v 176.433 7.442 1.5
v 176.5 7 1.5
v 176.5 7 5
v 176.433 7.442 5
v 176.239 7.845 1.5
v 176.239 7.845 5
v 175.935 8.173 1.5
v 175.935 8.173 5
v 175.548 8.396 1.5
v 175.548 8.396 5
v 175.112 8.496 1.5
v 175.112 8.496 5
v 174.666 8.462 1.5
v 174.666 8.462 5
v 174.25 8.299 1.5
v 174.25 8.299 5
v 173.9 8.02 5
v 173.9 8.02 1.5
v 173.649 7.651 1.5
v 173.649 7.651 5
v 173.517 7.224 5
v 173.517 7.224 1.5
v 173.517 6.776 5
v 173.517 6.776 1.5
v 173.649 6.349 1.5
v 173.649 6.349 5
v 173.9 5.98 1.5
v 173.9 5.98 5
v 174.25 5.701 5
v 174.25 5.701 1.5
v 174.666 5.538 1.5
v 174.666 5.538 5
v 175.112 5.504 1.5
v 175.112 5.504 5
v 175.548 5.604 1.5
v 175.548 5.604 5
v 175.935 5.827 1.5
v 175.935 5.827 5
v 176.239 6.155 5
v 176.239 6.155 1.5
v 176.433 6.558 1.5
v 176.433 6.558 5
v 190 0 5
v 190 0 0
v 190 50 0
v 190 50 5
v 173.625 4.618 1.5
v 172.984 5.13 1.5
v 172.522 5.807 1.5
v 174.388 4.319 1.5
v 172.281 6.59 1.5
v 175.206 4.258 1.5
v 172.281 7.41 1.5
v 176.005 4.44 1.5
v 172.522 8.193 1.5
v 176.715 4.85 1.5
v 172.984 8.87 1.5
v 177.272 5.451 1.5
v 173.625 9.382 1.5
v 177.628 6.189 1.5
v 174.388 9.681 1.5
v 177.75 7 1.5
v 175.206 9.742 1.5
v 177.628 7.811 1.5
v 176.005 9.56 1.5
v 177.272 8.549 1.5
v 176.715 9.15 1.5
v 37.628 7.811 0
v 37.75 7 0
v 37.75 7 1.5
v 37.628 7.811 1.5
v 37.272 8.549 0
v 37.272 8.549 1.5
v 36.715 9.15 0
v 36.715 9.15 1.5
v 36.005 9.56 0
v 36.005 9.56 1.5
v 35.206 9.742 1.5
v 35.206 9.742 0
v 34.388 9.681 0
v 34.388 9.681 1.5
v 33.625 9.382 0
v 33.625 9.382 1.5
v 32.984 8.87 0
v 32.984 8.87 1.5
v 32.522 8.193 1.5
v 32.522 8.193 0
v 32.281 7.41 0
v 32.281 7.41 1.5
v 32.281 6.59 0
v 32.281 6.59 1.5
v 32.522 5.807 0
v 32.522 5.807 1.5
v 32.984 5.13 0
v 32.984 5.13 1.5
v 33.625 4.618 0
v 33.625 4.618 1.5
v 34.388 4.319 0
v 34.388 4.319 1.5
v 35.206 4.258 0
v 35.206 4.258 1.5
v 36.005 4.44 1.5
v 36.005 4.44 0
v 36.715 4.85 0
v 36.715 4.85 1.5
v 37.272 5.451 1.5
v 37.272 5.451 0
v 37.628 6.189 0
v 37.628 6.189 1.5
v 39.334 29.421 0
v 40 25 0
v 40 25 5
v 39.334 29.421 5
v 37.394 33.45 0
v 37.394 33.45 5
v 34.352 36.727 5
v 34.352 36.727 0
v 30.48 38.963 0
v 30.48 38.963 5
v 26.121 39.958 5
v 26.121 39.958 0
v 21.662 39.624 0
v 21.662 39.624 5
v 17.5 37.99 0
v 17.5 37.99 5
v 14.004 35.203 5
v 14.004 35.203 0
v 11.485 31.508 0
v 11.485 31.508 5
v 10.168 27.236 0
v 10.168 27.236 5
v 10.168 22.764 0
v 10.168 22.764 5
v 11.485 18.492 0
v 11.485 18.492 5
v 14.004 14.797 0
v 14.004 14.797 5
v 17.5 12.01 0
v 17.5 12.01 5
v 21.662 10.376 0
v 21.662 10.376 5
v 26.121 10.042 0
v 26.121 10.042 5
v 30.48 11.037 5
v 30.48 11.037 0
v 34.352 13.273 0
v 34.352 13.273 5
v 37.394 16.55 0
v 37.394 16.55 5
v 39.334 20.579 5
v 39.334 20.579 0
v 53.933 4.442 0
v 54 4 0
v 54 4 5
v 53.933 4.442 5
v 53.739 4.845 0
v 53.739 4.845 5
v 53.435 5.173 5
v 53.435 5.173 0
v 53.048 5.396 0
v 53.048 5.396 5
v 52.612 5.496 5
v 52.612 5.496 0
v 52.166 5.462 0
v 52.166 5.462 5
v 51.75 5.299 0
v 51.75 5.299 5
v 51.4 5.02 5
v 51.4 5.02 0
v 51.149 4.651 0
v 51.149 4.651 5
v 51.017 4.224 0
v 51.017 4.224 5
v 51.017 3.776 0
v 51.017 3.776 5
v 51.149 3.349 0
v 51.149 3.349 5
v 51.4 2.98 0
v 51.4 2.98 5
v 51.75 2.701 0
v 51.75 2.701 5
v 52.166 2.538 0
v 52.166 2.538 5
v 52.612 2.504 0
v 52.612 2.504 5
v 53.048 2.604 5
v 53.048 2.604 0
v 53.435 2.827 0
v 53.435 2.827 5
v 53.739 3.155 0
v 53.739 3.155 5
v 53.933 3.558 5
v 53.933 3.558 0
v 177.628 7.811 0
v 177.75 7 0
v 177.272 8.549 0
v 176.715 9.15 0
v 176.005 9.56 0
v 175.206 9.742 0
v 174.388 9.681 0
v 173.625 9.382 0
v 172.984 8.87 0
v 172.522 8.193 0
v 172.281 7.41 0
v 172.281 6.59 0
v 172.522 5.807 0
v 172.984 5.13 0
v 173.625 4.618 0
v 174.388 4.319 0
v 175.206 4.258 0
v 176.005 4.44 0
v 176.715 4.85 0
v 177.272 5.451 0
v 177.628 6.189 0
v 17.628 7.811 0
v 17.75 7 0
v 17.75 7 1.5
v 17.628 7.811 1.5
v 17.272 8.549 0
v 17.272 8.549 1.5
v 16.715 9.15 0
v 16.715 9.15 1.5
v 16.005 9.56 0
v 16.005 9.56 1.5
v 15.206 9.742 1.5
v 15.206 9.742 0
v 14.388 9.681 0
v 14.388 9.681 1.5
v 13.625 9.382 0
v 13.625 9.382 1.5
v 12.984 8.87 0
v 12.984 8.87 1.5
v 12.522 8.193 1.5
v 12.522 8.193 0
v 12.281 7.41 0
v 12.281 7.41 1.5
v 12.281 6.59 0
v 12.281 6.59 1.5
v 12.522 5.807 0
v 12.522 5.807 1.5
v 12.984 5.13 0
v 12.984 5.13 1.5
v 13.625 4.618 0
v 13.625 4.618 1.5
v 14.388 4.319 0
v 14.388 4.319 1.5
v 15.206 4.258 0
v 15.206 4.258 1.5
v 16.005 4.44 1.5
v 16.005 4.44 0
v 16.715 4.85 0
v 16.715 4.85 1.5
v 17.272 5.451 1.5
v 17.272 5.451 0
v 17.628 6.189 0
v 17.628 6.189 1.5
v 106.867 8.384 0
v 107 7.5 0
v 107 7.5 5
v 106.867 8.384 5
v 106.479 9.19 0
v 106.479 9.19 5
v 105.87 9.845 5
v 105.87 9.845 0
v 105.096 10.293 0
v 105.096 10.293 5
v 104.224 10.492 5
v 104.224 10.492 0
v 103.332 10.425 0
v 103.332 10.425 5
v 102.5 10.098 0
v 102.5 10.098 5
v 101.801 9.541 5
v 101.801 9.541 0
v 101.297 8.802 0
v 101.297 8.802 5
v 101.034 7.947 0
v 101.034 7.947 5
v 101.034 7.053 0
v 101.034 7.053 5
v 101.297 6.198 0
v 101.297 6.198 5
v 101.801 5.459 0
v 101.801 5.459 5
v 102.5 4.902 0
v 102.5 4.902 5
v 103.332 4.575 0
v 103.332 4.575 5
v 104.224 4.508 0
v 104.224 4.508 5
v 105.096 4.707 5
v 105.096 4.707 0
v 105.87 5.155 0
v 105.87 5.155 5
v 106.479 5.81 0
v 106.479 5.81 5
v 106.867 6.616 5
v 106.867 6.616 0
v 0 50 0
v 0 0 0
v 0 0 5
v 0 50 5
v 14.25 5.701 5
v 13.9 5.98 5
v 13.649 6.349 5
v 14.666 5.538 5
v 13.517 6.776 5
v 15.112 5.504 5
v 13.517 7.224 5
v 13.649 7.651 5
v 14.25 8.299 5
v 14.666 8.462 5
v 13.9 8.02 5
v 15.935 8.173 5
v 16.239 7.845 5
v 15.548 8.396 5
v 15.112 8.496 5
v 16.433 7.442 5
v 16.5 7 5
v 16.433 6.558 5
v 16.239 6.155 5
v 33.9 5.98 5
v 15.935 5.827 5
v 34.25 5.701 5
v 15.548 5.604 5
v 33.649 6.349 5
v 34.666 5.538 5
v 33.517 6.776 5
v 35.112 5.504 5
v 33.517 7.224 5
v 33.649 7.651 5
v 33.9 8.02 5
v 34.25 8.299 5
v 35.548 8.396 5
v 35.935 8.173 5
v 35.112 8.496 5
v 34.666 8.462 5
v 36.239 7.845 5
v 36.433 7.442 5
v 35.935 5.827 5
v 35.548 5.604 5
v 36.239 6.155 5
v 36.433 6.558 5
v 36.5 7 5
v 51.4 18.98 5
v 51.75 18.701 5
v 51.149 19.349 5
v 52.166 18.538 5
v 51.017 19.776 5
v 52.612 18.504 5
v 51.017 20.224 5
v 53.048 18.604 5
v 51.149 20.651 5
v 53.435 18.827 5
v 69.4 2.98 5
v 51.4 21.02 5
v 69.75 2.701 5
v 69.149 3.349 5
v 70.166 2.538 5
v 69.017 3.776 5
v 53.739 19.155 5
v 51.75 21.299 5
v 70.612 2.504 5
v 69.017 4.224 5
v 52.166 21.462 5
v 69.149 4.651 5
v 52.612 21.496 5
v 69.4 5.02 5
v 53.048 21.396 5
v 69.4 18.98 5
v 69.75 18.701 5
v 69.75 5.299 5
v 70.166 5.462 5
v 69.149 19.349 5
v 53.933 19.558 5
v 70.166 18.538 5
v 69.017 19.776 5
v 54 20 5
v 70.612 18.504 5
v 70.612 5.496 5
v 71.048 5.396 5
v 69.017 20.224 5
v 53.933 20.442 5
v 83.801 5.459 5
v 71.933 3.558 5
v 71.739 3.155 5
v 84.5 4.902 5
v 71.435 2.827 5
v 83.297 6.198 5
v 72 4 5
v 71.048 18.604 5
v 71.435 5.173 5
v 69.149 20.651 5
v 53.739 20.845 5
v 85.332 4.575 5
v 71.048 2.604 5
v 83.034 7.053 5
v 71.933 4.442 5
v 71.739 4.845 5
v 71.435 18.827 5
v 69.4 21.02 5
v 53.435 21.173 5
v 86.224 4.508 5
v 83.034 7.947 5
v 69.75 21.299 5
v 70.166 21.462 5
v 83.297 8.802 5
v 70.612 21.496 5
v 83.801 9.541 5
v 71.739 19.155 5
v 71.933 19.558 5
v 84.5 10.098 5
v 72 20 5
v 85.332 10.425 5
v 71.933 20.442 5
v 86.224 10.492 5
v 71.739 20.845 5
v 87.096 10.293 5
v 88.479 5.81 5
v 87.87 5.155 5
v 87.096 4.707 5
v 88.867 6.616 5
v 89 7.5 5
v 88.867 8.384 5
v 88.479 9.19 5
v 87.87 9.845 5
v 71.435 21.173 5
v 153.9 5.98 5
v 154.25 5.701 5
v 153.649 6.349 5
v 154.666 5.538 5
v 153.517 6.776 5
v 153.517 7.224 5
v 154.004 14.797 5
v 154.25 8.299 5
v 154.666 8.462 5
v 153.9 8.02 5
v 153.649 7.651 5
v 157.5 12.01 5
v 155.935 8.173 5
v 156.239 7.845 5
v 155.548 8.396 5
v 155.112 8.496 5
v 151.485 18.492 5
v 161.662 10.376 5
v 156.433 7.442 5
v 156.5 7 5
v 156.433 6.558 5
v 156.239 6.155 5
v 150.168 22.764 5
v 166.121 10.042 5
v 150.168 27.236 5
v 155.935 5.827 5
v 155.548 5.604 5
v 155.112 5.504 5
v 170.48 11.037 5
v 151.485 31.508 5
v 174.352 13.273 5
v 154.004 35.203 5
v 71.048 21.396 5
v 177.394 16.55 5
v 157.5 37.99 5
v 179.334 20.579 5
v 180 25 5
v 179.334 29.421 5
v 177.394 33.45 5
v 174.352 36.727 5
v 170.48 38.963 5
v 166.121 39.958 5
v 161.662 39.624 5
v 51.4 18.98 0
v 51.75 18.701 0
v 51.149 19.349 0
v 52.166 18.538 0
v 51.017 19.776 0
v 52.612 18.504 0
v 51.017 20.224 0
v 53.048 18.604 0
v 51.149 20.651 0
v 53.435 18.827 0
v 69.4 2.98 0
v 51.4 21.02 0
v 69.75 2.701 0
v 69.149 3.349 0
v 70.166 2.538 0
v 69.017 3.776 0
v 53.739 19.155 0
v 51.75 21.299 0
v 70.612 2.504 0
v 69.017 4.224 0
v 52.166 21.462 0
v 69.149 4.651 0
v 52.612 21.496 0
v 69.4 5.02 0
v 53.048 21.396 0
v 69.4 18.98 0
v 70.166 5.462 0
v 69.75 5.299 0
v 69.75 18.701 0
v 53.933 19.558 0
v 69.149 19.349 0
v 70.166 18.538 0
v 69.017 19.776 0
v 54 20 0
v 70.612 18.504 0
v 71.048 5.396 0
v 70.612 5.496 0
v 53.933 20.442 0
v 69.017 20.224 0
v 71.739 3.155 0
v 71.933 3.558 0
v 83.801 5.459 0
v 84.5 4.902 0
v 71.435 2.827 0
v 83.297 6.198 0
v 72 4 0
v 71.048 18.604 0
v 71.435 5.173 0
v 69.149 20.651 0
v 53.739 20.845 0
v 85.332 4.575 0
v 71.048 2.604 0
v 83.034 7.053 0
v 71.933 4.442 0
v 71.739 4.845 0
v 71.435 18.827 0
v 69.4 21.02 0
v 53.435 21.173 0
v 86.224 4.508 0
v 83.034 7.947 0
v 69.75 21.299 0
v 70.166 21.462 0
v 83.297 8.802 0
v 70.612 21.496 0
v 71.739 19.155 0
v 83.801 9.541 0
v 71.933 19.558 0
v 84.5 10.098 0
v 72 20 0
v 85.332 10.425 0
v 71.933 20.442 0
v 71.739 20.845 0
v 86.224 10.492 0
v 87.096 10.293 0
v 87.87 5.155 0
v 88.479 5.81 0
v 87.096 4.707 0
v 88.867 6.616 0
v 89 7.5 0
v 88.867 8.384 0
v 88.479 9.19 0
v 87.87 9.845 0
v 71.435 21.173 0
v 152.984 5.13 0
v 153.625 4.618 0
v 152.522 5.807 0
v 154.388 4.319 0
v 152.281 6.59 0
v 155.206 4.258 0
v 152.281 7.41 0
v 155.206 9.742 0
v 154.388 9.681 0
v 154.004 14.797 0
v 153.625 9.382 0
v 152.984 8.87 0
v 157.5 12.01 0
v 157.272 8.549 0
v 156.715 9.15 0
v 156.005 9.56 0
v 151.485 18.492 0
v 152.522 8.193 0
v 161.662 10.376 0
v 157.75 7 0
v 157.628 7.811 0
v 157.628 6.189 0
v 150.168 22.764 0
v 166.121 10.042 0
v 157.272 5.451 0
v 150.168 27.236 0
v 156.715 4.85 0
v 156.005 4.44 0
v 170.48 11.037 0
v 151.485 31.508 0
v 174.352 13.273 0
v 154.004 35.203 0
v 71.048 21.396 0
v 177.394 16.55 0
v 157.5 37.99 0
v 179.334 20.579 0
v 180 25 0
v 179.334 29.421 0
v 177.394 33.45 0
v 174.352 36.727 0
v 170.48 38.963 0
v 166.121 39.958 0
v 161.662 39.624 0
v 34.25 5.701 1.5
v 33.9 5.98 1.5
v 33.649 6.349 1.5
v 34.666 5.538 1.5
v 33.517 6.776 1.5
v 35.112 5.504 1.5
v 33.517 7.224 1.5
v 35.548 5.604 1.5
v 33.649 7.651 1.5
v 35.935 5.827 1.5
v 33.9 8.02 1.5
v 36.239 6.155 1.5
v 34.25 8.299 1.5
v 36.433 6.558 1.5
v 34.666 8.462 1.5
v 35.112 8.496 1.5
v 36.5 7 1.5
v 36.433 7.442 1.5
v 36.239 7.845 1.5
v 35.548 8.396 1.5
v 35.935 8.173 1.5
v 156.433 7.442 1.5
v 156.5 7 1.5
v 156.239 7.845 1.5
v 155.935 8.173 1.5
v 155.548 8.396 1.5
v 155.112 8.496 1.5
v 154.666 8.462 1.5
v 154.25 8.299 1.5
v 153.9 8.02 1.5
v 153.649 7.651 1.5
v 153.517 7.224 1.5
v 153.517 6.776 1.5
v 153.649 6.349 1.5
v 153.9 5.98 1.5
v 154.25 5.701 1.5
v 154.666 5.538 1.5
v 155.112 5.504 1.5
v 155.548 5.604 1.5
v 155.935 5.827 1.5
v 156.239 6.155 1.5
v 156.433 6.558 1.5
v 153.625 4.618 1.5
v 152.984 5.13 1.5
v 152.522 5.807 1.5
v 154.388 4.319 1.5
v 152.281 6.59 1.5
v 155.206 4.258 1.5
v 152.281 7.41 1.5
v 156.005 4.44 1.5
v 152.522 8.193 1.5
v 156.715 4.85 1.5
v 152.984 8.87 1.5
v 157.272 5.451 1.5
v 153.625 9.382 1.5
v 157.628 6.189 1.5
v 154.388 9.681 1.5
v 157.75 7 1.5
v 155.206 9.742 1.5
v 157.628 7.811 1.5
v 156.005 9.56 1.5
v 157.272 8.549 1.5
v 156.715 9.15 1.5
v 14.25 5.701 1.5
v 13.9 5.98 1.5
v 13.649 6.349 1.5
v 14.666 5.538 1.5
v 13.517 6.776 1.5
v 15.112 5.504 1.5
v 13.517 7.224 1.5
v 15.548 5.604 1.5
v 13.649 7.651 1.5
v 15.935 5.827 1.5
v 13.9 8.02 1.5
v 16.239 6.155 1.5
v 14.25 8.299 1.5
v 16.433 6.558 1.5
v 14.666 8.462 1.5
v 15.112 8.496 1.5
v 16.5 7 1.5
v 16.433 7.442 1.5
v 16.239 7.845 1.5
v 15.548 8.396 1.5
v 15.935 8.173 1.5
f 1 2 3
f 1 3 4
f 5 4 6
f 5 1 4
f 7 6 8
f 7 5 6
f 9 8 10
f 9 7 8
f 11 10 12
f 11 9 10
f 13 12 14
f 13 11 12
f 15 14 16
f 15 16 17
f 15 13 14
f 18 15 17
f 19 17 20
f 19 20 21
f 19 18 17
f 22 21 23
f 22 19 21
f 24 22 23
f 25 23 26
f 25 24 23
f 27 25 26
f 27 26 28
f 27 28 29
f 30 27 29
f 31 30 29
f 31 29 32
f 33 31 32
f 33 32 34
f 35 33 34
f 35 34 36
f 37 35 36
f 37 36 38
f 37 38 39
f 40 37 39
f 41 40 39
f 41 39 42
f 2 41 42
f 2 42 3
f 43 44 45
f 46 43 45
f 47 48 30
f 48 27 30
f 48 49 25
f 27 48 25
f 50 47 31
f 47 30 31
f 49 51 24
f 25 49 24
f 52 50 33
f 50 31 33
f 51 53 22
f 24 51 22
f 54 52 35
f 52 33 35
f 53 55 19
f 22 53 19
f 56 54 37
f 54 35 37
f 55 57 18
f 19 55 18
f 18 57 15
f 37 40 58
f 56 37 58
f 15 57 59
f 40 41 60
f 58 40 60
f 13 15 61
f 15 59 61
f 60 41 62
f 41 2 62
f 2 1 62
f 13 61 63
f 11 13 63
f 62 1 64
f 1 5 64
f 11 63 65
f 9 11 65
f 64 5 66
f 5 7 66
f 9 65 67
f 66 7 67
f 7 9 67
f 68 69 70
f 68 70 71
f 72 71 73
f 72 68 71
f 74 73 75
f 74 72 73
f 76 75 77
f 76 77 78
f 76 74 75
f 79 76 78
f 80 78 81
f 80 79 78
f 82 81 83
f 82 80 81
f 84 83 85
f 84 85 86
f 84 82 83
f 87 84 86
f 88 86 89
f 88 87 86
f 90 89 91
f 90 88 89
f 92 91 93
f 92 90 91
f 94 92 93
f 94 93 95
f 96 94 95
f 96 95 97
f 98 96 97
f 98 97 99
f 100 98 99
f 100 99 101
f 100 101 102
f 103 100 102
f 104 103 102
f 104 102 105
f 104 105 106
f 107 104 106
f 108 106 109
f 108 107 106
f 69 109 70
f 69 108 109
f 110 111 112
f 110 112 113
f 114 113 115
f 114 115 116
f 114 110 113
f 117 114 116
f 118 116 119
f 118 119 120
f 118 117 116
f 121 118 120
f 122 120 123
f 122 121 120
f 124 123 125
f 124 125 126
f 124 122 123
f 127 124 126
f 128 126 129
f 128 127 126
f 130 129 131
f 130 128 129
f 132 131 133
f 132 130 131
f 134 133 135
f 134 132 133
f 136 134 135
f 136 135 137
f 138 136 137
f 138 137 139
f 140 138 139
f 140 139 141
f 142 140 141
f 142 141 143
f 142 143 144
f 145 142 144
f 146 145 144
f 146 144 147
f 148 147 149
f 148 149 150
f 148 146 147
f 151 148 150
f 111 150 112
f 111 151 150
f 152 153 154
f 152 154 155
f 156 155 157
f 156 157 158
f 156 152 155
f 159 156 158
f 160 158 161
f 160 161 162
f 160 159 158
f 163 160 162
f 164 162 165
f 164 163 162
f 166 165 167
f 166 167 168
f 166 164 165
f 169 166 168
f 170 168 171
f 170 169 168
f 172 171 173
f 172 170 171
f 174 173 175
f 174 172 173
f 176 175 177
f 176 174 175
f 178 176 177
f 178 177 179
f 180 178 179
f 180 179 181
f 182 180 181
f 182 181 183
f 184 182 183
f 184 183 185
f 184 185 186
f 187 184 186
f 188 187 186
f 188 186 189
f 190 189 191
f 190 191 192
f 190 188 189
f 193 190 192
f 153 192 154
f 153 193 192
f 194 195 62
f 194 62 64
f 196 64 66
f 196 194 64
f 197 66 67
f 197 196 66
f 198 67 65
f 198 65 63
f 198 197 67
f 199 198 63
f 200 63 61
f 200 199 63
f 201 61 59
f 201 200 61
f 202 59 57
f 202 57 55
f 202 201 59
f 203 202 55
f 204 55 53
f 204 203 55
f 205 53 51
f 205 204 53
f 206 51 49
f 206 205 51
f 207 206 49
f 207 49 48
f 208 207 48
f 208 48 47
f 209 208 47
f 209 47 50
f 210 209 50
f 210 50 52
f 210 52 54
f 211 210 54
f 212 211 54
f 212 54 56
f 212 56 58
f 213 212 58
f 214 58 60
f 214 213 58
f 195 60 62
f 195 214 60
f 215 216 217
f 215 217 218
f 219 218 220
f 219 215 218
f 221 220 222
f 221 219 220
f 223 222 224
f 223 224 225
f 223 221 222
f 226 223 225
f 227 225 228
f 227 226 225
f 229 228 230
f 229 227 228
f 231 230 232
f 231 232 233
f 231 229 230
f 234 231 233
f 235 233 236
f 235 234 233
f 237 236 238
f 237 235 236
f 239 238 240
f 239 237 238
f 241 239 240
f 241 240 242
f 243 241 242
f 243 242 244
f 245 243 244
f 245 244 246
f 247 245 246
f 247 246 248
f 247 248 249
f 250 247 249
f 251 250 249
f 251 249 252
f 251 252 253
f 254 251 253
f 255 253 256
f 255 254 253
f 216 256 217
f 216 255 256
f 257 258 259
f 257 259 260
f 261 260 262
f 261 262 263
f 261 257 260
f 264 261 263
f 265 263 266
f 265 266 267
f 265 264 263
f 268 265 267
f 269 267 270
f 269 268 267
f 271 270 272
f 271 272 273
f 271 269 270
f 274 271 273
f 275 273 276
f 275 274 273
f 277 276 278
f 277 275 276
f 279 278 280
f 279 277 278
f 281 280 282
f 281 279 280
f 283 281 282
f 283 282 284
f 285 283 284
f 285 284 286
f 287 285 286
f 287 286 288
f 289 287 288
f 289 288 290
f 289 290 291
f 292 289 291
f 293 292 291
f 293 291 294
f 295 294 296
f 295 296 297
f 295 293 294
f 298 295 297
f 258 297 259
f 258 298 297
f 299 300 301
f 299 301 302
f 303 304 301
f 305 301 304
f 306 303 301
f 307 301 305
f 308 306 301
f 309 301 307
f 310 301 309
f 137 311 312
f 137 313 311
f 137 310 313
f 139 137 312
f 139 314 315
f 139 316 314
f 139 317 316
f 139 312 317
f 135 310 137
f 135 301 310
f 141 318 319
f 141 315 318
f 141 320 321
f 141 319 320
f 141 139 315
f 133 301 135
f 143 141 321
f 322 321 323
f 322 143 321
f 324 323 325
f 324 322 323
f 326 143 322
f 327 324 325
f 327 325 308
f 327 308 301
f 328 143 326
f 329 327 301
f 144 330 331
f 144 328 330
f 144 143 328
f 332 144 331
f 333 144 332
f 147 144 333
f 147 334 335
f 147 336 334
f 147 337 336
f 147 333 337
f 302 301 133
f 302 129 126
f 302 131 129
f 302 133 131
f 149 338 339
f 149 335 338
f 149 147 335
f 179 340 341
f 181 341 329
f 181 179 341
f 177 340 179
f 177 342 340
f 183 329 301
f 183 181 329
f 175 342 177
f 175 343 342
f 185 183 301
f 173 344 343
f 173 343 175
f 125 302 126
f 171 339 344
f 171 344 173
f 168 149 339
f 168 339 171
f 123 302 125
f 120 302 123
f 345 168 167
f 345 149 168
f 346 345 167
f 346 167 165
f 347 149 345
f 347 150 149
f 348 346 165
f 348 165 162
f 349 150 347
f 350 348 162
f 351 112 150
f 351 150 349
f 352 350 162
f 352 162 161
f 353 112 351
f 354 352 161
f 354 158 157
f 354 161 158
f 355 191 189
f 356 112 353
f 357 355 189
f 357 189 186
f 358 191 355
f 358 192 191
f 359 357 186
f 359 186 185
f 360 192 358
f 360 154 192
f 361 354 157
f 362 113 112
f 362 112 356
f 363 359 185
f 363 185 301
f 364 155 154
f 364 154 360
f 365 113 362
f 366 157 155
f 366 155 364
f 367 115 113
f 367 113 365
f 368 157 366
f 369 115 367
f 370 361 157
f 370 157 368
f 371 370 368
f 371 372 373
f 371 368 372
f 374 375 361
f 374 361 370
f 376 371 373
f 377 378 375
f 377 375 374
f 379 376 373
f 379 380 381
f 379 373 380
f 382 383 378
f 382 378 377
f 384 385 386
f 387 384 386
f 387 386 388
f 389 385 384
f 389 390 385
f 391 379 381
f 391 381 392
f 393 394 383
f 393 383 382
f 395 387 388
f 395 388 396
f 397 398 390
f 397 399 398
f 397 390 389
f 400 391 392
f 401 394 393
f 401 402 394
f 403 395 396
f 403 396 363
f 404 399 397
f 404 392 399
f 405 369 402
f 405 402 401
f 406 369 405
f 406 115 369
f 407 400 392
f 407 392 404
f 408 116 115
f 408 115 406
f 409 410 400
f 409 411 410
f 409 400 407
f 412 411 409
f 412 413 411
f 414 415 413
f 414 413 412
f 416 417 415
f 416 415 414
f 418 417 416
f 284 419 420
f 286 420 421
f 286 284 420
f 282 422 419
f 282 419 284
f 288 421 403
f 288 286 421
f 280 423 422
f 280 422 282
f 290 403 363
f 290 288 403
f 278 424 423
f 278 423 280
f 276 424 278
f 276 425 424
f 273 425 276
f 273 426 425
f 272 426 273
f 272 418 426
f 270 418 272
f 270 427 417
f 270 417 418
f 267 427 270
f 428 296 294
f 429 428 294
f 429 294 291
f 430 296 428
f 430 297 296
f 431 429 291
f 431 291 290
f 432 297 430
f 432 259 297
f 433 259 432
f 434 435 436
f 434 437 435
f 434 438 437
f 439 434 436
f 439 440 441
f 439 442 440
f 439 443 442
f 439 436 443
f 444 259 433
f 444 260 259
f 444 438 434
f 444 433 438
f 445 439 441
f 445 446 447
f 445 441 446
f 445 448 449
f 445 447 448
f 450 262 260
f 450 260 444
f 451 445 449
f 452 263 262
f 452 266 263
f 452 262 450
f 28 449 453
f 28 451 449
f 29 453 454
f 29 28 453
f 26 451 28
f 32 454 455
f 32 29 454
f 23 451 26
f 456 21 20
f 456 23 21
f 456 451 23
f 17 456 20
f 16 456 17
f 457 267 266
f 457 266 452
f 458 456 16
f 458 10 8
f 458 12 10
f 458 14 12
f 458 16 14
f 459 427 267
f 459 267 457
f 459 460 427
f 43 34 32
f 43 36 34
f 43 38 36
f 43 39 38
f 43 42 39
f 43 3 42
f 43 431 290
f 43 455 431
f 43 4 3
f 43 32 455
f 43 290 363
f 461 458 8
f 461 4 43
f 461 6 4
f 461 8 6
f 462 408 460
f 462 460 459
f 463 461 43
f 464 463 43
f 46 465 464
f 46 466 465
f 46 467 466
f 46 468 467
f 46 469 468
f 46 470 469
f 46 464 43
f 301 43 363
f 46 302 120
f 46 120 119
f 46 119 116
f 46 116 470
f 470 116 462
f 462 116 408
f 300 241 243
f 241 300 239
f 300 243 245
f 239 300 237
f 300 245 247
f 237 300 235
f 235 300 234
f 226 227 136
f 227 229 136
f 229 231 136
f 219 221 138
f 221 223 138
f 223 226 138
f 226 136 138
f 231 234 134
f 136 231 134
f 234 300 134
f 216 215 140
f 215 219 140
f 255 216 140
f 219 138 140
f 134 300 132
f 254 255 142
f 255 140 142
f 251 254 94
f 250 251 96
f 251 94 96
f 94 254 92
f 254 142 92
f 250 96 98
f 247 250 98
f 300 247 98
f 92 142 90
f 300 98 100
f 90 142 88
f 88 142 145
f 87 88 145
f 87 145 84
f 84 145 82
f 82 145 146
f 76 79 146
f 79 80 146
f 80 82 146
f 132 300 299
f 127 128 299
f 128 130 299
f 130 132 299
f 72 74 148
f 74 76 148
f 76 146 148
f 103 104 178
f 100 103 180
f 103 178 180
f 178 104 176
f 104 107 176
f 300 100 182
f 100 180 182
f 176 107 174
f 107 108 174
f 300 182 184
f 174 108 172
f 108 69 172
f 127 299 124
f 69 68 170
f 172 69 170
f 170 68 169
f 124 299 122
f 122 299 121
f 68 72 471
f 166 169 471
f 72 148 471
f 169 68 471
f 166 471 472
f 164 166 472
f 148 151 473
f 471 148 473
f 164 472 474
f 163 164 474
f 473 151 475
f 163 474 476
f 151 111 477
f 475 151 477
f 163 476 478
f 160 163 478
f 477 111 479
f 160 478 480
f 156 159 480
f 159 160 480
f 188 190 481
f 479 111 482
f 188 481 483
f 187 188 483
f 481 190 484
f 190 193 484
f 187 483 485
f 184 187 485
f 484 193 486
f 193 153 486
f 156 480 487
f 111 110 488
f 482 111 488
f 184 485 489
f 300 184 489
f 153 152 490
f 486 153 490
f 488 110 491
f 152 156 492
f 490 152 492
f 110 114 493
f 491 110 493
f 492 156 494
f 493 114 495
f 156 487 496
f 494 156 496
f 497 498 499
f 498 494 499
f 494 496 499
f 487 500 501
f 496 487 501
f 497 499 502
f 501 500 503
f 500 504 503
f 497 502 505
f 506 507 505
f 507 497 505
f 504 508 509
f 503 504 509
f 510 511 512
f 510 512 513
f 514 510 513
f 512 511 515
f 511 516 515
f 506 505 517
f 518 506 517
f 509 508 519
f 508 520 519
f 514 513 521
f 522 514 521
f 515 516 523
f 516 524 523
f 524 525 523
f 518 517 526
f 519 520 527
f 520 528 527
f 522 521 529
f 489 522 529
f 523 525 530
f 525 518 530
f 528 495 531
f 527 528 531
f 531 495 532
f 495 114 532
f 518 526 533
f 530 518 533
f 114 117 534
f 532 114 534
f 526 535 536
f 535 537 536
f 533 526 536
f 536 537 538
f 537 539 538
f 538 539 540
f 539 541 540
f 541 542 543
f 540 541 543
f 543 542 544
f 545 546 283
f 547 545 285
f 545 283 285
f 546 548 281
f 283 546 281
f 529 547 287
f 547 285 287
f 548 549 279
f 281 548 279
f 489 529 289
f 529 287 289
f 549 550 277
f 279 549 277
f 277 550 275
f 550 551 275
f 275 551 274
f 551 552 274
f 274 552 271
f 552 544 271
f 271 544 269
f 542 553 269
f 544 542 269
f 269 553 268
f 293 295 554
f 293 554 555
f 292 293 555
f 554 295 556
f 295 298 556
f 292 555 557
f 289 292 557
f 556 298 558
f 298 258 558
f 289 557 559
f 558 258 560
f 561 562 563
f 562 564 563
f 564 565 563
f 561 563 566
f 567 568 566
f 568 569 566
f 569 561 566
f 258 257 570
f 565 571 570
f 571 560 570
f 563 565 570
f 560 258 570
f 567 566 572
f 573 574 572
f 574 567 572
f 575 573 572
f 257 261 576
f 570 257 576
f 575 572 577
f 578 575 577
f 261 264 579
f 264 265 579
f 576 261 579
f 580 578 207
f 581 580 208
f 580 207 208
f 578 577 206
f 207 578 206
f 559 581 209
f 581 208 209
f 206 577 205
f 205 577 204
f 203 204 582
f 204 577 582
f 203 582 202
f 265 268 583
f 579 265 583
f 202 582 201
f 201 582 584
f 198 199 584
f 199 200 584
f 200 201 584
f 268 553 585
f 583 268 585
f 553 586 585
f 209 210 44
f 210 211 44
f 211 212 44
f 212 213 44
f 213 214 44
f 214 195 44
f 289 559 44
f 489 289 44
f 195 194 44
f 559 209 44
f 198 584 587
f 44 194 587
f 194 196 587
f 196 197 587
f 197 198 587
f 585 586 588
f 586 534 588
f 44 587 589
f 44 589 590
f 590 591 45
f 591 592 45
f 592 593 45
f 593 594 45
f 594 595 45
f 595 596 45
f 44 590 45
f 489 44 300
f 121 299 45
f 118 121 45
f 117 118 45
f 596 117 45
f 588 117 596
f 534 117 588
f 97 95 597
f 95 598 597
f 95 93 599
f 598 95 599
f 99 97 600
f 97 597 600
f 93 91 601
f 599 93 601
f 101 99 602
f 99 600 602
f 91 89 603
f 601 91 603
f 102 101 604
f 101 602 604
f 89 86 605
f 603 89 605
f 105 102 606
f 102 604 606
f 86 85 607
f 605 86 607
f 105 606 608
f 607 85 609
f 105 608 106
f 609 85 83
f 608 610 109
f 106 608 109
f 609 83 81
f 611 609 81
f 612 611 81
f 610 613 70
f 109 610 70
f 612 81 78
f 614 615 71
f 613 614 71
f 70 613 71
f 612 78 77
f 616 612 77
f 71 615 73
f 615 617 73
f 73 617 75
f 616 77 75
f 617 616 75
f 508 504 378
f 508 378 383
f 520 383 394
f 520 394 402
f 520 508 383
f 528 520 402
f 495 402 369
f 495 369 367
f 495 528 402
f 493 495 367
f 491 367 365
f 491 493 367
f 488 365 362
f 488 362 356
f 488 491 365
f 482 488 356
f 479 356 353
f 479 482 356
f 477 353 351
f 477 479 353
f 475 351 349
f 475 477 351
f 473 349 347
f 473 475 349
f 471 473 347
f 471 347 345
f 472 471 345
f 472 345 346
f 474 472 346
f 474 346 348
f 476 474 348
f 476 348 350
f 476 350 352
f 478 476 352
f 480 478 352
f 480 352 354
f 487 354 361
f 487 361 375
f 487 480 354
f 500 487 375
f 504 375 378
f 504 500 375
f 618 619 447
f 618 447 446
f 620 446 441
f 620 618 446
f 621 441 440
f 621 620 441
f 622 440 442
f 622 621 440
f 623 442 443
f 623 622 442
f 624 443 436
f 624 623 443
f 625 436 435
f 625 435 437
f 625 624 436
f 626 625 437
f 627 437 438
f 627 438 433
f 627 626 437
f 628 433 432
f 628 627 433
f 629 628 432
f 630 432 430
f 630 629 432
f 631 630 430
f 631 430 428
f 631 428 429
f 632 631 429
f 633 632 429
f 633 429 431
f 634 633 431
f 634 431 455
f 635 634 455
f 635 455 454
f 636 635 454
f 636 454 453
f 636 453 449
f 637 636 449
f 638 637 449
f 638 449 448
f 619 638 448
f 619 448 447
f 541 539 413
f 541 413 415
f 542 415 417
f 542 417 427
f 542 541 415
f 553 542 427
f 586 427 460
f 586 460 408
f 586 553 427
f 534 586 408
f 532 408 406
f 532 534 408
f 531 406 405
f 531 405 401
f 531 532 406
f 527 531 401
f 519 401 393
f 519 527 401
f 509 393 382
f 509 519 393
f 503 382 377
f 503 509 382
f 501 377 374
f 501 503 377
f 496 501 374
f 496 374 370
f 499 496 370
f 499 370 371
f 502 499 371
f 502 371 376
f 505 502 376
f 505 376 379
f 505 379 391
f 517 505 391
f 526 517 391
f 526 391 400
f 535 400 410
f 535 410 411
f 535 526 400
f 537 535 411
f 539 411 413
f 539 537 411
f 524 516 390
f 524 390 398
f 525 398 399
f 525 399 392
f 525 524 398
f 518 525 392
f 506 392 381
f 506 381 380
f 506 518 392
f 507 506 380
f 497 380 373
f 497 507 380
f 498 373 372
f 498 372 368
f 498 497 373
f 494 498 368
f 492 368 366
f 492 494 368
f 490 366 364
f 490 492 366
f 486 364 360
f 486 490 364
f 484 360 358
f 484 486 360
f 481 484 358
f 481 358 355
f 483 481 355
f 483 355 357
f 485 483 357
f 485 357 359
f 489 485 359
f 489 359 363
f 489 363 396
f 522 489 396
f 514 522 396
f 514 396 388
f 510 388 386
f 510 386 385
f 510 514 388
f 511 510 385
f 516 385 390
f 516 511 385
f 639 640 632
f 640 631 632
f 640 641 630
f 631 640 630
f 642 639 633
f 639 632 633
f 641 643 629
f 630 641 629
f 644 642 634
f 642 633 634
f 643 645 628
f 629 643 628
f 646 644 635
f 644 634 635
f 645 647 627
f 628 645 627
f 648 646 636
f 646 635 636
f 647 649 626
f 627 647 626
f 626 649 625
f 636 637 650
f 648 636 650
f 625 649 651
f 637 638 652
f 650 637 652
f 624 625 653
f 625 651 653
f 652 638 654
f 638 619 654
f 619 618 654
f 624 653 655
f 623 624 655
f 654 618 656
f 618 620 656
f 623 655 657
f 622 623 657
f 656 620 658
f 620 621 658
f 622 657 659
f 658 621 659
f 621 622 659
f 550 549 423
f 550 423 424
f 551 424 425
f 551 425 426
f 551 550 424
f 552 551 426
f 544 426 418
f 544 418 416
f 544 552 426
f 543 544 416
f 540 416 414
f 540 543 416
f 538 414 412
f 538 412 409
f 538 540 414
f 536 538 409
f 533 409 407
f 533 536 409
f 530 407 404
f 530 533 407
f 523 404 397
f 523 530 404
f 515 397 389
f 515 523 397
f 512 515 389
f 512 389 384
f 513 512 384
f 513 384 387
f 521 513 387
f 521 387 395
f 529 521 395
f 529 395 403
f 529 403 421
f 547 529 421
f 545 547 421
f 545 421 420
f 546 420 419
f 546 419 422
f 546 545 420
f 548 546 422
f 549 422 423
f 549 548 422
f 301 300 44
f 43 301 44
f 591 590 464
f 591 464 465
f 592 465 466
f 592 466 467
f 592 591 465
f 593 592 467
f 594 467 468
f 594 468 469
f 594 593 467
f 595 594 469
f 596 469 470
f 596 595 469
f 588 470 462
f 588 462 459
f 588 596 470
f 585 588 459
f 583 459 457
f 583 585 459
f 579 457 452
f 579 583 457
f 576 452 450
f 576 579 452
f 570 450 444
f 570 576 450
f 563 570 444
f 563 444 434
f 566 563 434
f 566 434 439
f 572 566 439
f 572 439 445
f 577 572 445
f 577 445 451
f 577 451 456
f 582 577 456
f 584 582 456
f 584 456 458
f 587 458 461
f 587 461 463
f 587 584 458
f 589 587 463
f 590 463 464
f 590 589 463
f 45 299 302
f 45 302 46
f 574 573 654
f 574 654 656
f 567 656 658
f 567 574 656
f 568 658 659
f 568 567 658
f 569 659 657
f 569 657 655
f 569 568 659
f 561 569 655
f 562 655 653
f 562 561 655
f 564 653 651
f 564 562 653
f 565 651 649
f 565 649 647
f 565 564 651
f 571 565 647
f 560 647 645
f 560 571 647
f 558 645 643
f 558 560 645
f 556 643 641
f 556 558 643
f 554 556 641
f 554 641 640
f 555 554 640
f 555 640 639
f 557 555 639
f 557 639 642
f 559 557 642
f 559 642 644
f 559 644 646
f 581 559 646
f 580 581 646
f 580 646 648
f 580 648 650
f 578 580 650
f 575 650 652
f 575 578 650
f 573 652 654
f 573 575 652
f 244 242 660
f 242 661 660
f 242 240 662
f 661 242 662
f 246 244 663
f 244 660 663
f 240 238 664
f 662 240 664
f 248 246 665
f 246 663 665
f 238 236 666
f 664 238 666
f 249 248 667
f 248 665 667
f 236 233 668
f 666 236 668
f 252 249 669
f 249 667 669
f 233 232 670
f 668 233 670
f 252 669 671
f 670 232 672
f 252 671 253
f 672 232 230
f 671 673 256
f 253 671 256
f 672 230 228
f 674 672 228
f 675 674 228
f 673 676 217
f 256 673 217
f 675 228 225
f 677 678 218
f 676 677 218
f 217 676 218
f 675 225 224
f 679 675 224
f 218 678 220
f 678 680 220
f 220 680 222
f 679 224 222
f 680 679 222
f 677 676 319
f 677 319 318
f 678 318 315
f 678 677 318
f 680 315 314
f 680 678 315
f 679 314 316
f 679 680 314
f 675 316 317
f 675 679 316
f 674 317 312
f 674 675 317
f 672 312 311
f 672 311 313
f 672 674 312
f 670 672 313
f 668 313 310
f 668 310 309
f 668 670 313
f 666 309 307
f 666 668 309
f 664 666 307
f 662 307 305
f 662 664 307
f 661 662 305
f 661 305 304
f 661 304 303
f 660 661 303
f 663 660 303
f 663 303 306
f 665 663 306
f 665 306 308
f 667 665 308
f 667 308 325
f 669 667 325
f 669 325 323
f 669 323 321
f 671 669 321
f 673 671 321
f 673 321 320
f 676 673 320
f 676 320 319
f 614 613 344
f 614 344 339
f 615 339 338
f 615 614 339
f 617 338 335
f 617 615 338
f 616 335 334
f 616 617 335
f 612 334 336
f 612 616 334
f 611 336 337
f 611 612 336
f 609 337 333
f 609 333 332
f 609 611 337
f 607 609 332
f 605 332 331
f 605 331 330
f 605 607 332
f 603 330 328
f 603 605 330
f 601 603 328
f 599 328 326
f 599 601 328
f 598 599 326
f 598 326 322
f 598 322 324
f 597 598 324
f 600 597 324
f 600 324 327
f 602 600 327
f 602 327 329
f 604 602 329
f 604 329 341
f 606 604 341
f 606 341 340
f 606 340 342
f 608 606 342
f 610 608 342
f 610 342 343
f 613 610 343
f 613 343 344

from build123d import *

# Parameters (mm, degrees)
SKETCH1_W           = 190
SKETCH1_H           = 50
SKETCH1_R           = 15
SKETCH1_R_2         = 1.5
SKETCH1_R_3         = 3
BOSS_EXTRUDE1_DEPTH = 5
CUT_EXTRUDE1_START  = -5
SKETCH2_R           = 2.75
CUT_EXTRUDE1_DEPTH  = 1.5


with BuildPart() as part:
    # Sketch1 → Boss-Extrude1 (new body)
    with BuildSketch(Plane.XY):
        with Locations((95, 25)):
            Rectangle(SKETCH1_W, SKETCH1_H)
        with Locations((25, 25)):
            Circle(SKETCH1_R, mode=Mode.SUBTRACT)
        with Locations((165, 25)):
            Circle(SKETCH1_R, mode=Mode.SUBTRACT)
        with Locations((35, 7)):
            Circle(SKETCH1_R_2, mode=Mode.SUBTRACT)
        with Locations((175, 7)):
            Circle(SKETCH1_R_2, mode=Mode.SUBTRACT)
        with Locations((155, 7)):
            Circle(SKETCH1_R_2, mode=Mode.SUBTRACT)
        with Locations((70.5, 20)):
            Circle(SKETCH1_R_2, mode=Mode.SUBTRACT)
        with Locations((86, 7.5)):
            Circle(SKETCH1_R_3, mode=Mode.SUBTRACT)
        with Locations((104, 7.5)):
            Circle(SKETCH1_R_3, mode=Mode.SUBTRACT)
        with Locations((15, 7)):
            Circle(SKETCH1_R_2, mode=Mode.SUBTRACT)
        with Locations((52.5, 4)):
            Circle(SKETCH1_R_2, mode=Mode.SUBTRACT)
        with Locations((52.5, 20)):
            Circle(SKETCH1_R_2, mode=Mode.SUBTRACT)
        with Locations((70.5, 4)):
            Circle(SKETCH1_R_2, mode=Mode.SUBTRACT)
    extrude(amount=BOSS_EXTRUDE1_DEPTH)

    # Sketch2 → Cut-Extrude1 (cut)
    with BuildSketch(Plane.XY.offset(5).offset(CUT_EXTRUDE1_START)):
        with Locations((15, 7)):
            Circle(SKETCH2_R)
        with Locations((35, 7)):
            Circle(SKETCH2_R)
        with Locations((155, 7)):
            Circle(SKETCH2_R)
        with Locations((175, 7)):
            Circle(SKETCH2_R)
    extrude(amount=CUT_EXTRUDE1_DEPTH, mode=Mode.SUBTRACT)


solid = part.part
